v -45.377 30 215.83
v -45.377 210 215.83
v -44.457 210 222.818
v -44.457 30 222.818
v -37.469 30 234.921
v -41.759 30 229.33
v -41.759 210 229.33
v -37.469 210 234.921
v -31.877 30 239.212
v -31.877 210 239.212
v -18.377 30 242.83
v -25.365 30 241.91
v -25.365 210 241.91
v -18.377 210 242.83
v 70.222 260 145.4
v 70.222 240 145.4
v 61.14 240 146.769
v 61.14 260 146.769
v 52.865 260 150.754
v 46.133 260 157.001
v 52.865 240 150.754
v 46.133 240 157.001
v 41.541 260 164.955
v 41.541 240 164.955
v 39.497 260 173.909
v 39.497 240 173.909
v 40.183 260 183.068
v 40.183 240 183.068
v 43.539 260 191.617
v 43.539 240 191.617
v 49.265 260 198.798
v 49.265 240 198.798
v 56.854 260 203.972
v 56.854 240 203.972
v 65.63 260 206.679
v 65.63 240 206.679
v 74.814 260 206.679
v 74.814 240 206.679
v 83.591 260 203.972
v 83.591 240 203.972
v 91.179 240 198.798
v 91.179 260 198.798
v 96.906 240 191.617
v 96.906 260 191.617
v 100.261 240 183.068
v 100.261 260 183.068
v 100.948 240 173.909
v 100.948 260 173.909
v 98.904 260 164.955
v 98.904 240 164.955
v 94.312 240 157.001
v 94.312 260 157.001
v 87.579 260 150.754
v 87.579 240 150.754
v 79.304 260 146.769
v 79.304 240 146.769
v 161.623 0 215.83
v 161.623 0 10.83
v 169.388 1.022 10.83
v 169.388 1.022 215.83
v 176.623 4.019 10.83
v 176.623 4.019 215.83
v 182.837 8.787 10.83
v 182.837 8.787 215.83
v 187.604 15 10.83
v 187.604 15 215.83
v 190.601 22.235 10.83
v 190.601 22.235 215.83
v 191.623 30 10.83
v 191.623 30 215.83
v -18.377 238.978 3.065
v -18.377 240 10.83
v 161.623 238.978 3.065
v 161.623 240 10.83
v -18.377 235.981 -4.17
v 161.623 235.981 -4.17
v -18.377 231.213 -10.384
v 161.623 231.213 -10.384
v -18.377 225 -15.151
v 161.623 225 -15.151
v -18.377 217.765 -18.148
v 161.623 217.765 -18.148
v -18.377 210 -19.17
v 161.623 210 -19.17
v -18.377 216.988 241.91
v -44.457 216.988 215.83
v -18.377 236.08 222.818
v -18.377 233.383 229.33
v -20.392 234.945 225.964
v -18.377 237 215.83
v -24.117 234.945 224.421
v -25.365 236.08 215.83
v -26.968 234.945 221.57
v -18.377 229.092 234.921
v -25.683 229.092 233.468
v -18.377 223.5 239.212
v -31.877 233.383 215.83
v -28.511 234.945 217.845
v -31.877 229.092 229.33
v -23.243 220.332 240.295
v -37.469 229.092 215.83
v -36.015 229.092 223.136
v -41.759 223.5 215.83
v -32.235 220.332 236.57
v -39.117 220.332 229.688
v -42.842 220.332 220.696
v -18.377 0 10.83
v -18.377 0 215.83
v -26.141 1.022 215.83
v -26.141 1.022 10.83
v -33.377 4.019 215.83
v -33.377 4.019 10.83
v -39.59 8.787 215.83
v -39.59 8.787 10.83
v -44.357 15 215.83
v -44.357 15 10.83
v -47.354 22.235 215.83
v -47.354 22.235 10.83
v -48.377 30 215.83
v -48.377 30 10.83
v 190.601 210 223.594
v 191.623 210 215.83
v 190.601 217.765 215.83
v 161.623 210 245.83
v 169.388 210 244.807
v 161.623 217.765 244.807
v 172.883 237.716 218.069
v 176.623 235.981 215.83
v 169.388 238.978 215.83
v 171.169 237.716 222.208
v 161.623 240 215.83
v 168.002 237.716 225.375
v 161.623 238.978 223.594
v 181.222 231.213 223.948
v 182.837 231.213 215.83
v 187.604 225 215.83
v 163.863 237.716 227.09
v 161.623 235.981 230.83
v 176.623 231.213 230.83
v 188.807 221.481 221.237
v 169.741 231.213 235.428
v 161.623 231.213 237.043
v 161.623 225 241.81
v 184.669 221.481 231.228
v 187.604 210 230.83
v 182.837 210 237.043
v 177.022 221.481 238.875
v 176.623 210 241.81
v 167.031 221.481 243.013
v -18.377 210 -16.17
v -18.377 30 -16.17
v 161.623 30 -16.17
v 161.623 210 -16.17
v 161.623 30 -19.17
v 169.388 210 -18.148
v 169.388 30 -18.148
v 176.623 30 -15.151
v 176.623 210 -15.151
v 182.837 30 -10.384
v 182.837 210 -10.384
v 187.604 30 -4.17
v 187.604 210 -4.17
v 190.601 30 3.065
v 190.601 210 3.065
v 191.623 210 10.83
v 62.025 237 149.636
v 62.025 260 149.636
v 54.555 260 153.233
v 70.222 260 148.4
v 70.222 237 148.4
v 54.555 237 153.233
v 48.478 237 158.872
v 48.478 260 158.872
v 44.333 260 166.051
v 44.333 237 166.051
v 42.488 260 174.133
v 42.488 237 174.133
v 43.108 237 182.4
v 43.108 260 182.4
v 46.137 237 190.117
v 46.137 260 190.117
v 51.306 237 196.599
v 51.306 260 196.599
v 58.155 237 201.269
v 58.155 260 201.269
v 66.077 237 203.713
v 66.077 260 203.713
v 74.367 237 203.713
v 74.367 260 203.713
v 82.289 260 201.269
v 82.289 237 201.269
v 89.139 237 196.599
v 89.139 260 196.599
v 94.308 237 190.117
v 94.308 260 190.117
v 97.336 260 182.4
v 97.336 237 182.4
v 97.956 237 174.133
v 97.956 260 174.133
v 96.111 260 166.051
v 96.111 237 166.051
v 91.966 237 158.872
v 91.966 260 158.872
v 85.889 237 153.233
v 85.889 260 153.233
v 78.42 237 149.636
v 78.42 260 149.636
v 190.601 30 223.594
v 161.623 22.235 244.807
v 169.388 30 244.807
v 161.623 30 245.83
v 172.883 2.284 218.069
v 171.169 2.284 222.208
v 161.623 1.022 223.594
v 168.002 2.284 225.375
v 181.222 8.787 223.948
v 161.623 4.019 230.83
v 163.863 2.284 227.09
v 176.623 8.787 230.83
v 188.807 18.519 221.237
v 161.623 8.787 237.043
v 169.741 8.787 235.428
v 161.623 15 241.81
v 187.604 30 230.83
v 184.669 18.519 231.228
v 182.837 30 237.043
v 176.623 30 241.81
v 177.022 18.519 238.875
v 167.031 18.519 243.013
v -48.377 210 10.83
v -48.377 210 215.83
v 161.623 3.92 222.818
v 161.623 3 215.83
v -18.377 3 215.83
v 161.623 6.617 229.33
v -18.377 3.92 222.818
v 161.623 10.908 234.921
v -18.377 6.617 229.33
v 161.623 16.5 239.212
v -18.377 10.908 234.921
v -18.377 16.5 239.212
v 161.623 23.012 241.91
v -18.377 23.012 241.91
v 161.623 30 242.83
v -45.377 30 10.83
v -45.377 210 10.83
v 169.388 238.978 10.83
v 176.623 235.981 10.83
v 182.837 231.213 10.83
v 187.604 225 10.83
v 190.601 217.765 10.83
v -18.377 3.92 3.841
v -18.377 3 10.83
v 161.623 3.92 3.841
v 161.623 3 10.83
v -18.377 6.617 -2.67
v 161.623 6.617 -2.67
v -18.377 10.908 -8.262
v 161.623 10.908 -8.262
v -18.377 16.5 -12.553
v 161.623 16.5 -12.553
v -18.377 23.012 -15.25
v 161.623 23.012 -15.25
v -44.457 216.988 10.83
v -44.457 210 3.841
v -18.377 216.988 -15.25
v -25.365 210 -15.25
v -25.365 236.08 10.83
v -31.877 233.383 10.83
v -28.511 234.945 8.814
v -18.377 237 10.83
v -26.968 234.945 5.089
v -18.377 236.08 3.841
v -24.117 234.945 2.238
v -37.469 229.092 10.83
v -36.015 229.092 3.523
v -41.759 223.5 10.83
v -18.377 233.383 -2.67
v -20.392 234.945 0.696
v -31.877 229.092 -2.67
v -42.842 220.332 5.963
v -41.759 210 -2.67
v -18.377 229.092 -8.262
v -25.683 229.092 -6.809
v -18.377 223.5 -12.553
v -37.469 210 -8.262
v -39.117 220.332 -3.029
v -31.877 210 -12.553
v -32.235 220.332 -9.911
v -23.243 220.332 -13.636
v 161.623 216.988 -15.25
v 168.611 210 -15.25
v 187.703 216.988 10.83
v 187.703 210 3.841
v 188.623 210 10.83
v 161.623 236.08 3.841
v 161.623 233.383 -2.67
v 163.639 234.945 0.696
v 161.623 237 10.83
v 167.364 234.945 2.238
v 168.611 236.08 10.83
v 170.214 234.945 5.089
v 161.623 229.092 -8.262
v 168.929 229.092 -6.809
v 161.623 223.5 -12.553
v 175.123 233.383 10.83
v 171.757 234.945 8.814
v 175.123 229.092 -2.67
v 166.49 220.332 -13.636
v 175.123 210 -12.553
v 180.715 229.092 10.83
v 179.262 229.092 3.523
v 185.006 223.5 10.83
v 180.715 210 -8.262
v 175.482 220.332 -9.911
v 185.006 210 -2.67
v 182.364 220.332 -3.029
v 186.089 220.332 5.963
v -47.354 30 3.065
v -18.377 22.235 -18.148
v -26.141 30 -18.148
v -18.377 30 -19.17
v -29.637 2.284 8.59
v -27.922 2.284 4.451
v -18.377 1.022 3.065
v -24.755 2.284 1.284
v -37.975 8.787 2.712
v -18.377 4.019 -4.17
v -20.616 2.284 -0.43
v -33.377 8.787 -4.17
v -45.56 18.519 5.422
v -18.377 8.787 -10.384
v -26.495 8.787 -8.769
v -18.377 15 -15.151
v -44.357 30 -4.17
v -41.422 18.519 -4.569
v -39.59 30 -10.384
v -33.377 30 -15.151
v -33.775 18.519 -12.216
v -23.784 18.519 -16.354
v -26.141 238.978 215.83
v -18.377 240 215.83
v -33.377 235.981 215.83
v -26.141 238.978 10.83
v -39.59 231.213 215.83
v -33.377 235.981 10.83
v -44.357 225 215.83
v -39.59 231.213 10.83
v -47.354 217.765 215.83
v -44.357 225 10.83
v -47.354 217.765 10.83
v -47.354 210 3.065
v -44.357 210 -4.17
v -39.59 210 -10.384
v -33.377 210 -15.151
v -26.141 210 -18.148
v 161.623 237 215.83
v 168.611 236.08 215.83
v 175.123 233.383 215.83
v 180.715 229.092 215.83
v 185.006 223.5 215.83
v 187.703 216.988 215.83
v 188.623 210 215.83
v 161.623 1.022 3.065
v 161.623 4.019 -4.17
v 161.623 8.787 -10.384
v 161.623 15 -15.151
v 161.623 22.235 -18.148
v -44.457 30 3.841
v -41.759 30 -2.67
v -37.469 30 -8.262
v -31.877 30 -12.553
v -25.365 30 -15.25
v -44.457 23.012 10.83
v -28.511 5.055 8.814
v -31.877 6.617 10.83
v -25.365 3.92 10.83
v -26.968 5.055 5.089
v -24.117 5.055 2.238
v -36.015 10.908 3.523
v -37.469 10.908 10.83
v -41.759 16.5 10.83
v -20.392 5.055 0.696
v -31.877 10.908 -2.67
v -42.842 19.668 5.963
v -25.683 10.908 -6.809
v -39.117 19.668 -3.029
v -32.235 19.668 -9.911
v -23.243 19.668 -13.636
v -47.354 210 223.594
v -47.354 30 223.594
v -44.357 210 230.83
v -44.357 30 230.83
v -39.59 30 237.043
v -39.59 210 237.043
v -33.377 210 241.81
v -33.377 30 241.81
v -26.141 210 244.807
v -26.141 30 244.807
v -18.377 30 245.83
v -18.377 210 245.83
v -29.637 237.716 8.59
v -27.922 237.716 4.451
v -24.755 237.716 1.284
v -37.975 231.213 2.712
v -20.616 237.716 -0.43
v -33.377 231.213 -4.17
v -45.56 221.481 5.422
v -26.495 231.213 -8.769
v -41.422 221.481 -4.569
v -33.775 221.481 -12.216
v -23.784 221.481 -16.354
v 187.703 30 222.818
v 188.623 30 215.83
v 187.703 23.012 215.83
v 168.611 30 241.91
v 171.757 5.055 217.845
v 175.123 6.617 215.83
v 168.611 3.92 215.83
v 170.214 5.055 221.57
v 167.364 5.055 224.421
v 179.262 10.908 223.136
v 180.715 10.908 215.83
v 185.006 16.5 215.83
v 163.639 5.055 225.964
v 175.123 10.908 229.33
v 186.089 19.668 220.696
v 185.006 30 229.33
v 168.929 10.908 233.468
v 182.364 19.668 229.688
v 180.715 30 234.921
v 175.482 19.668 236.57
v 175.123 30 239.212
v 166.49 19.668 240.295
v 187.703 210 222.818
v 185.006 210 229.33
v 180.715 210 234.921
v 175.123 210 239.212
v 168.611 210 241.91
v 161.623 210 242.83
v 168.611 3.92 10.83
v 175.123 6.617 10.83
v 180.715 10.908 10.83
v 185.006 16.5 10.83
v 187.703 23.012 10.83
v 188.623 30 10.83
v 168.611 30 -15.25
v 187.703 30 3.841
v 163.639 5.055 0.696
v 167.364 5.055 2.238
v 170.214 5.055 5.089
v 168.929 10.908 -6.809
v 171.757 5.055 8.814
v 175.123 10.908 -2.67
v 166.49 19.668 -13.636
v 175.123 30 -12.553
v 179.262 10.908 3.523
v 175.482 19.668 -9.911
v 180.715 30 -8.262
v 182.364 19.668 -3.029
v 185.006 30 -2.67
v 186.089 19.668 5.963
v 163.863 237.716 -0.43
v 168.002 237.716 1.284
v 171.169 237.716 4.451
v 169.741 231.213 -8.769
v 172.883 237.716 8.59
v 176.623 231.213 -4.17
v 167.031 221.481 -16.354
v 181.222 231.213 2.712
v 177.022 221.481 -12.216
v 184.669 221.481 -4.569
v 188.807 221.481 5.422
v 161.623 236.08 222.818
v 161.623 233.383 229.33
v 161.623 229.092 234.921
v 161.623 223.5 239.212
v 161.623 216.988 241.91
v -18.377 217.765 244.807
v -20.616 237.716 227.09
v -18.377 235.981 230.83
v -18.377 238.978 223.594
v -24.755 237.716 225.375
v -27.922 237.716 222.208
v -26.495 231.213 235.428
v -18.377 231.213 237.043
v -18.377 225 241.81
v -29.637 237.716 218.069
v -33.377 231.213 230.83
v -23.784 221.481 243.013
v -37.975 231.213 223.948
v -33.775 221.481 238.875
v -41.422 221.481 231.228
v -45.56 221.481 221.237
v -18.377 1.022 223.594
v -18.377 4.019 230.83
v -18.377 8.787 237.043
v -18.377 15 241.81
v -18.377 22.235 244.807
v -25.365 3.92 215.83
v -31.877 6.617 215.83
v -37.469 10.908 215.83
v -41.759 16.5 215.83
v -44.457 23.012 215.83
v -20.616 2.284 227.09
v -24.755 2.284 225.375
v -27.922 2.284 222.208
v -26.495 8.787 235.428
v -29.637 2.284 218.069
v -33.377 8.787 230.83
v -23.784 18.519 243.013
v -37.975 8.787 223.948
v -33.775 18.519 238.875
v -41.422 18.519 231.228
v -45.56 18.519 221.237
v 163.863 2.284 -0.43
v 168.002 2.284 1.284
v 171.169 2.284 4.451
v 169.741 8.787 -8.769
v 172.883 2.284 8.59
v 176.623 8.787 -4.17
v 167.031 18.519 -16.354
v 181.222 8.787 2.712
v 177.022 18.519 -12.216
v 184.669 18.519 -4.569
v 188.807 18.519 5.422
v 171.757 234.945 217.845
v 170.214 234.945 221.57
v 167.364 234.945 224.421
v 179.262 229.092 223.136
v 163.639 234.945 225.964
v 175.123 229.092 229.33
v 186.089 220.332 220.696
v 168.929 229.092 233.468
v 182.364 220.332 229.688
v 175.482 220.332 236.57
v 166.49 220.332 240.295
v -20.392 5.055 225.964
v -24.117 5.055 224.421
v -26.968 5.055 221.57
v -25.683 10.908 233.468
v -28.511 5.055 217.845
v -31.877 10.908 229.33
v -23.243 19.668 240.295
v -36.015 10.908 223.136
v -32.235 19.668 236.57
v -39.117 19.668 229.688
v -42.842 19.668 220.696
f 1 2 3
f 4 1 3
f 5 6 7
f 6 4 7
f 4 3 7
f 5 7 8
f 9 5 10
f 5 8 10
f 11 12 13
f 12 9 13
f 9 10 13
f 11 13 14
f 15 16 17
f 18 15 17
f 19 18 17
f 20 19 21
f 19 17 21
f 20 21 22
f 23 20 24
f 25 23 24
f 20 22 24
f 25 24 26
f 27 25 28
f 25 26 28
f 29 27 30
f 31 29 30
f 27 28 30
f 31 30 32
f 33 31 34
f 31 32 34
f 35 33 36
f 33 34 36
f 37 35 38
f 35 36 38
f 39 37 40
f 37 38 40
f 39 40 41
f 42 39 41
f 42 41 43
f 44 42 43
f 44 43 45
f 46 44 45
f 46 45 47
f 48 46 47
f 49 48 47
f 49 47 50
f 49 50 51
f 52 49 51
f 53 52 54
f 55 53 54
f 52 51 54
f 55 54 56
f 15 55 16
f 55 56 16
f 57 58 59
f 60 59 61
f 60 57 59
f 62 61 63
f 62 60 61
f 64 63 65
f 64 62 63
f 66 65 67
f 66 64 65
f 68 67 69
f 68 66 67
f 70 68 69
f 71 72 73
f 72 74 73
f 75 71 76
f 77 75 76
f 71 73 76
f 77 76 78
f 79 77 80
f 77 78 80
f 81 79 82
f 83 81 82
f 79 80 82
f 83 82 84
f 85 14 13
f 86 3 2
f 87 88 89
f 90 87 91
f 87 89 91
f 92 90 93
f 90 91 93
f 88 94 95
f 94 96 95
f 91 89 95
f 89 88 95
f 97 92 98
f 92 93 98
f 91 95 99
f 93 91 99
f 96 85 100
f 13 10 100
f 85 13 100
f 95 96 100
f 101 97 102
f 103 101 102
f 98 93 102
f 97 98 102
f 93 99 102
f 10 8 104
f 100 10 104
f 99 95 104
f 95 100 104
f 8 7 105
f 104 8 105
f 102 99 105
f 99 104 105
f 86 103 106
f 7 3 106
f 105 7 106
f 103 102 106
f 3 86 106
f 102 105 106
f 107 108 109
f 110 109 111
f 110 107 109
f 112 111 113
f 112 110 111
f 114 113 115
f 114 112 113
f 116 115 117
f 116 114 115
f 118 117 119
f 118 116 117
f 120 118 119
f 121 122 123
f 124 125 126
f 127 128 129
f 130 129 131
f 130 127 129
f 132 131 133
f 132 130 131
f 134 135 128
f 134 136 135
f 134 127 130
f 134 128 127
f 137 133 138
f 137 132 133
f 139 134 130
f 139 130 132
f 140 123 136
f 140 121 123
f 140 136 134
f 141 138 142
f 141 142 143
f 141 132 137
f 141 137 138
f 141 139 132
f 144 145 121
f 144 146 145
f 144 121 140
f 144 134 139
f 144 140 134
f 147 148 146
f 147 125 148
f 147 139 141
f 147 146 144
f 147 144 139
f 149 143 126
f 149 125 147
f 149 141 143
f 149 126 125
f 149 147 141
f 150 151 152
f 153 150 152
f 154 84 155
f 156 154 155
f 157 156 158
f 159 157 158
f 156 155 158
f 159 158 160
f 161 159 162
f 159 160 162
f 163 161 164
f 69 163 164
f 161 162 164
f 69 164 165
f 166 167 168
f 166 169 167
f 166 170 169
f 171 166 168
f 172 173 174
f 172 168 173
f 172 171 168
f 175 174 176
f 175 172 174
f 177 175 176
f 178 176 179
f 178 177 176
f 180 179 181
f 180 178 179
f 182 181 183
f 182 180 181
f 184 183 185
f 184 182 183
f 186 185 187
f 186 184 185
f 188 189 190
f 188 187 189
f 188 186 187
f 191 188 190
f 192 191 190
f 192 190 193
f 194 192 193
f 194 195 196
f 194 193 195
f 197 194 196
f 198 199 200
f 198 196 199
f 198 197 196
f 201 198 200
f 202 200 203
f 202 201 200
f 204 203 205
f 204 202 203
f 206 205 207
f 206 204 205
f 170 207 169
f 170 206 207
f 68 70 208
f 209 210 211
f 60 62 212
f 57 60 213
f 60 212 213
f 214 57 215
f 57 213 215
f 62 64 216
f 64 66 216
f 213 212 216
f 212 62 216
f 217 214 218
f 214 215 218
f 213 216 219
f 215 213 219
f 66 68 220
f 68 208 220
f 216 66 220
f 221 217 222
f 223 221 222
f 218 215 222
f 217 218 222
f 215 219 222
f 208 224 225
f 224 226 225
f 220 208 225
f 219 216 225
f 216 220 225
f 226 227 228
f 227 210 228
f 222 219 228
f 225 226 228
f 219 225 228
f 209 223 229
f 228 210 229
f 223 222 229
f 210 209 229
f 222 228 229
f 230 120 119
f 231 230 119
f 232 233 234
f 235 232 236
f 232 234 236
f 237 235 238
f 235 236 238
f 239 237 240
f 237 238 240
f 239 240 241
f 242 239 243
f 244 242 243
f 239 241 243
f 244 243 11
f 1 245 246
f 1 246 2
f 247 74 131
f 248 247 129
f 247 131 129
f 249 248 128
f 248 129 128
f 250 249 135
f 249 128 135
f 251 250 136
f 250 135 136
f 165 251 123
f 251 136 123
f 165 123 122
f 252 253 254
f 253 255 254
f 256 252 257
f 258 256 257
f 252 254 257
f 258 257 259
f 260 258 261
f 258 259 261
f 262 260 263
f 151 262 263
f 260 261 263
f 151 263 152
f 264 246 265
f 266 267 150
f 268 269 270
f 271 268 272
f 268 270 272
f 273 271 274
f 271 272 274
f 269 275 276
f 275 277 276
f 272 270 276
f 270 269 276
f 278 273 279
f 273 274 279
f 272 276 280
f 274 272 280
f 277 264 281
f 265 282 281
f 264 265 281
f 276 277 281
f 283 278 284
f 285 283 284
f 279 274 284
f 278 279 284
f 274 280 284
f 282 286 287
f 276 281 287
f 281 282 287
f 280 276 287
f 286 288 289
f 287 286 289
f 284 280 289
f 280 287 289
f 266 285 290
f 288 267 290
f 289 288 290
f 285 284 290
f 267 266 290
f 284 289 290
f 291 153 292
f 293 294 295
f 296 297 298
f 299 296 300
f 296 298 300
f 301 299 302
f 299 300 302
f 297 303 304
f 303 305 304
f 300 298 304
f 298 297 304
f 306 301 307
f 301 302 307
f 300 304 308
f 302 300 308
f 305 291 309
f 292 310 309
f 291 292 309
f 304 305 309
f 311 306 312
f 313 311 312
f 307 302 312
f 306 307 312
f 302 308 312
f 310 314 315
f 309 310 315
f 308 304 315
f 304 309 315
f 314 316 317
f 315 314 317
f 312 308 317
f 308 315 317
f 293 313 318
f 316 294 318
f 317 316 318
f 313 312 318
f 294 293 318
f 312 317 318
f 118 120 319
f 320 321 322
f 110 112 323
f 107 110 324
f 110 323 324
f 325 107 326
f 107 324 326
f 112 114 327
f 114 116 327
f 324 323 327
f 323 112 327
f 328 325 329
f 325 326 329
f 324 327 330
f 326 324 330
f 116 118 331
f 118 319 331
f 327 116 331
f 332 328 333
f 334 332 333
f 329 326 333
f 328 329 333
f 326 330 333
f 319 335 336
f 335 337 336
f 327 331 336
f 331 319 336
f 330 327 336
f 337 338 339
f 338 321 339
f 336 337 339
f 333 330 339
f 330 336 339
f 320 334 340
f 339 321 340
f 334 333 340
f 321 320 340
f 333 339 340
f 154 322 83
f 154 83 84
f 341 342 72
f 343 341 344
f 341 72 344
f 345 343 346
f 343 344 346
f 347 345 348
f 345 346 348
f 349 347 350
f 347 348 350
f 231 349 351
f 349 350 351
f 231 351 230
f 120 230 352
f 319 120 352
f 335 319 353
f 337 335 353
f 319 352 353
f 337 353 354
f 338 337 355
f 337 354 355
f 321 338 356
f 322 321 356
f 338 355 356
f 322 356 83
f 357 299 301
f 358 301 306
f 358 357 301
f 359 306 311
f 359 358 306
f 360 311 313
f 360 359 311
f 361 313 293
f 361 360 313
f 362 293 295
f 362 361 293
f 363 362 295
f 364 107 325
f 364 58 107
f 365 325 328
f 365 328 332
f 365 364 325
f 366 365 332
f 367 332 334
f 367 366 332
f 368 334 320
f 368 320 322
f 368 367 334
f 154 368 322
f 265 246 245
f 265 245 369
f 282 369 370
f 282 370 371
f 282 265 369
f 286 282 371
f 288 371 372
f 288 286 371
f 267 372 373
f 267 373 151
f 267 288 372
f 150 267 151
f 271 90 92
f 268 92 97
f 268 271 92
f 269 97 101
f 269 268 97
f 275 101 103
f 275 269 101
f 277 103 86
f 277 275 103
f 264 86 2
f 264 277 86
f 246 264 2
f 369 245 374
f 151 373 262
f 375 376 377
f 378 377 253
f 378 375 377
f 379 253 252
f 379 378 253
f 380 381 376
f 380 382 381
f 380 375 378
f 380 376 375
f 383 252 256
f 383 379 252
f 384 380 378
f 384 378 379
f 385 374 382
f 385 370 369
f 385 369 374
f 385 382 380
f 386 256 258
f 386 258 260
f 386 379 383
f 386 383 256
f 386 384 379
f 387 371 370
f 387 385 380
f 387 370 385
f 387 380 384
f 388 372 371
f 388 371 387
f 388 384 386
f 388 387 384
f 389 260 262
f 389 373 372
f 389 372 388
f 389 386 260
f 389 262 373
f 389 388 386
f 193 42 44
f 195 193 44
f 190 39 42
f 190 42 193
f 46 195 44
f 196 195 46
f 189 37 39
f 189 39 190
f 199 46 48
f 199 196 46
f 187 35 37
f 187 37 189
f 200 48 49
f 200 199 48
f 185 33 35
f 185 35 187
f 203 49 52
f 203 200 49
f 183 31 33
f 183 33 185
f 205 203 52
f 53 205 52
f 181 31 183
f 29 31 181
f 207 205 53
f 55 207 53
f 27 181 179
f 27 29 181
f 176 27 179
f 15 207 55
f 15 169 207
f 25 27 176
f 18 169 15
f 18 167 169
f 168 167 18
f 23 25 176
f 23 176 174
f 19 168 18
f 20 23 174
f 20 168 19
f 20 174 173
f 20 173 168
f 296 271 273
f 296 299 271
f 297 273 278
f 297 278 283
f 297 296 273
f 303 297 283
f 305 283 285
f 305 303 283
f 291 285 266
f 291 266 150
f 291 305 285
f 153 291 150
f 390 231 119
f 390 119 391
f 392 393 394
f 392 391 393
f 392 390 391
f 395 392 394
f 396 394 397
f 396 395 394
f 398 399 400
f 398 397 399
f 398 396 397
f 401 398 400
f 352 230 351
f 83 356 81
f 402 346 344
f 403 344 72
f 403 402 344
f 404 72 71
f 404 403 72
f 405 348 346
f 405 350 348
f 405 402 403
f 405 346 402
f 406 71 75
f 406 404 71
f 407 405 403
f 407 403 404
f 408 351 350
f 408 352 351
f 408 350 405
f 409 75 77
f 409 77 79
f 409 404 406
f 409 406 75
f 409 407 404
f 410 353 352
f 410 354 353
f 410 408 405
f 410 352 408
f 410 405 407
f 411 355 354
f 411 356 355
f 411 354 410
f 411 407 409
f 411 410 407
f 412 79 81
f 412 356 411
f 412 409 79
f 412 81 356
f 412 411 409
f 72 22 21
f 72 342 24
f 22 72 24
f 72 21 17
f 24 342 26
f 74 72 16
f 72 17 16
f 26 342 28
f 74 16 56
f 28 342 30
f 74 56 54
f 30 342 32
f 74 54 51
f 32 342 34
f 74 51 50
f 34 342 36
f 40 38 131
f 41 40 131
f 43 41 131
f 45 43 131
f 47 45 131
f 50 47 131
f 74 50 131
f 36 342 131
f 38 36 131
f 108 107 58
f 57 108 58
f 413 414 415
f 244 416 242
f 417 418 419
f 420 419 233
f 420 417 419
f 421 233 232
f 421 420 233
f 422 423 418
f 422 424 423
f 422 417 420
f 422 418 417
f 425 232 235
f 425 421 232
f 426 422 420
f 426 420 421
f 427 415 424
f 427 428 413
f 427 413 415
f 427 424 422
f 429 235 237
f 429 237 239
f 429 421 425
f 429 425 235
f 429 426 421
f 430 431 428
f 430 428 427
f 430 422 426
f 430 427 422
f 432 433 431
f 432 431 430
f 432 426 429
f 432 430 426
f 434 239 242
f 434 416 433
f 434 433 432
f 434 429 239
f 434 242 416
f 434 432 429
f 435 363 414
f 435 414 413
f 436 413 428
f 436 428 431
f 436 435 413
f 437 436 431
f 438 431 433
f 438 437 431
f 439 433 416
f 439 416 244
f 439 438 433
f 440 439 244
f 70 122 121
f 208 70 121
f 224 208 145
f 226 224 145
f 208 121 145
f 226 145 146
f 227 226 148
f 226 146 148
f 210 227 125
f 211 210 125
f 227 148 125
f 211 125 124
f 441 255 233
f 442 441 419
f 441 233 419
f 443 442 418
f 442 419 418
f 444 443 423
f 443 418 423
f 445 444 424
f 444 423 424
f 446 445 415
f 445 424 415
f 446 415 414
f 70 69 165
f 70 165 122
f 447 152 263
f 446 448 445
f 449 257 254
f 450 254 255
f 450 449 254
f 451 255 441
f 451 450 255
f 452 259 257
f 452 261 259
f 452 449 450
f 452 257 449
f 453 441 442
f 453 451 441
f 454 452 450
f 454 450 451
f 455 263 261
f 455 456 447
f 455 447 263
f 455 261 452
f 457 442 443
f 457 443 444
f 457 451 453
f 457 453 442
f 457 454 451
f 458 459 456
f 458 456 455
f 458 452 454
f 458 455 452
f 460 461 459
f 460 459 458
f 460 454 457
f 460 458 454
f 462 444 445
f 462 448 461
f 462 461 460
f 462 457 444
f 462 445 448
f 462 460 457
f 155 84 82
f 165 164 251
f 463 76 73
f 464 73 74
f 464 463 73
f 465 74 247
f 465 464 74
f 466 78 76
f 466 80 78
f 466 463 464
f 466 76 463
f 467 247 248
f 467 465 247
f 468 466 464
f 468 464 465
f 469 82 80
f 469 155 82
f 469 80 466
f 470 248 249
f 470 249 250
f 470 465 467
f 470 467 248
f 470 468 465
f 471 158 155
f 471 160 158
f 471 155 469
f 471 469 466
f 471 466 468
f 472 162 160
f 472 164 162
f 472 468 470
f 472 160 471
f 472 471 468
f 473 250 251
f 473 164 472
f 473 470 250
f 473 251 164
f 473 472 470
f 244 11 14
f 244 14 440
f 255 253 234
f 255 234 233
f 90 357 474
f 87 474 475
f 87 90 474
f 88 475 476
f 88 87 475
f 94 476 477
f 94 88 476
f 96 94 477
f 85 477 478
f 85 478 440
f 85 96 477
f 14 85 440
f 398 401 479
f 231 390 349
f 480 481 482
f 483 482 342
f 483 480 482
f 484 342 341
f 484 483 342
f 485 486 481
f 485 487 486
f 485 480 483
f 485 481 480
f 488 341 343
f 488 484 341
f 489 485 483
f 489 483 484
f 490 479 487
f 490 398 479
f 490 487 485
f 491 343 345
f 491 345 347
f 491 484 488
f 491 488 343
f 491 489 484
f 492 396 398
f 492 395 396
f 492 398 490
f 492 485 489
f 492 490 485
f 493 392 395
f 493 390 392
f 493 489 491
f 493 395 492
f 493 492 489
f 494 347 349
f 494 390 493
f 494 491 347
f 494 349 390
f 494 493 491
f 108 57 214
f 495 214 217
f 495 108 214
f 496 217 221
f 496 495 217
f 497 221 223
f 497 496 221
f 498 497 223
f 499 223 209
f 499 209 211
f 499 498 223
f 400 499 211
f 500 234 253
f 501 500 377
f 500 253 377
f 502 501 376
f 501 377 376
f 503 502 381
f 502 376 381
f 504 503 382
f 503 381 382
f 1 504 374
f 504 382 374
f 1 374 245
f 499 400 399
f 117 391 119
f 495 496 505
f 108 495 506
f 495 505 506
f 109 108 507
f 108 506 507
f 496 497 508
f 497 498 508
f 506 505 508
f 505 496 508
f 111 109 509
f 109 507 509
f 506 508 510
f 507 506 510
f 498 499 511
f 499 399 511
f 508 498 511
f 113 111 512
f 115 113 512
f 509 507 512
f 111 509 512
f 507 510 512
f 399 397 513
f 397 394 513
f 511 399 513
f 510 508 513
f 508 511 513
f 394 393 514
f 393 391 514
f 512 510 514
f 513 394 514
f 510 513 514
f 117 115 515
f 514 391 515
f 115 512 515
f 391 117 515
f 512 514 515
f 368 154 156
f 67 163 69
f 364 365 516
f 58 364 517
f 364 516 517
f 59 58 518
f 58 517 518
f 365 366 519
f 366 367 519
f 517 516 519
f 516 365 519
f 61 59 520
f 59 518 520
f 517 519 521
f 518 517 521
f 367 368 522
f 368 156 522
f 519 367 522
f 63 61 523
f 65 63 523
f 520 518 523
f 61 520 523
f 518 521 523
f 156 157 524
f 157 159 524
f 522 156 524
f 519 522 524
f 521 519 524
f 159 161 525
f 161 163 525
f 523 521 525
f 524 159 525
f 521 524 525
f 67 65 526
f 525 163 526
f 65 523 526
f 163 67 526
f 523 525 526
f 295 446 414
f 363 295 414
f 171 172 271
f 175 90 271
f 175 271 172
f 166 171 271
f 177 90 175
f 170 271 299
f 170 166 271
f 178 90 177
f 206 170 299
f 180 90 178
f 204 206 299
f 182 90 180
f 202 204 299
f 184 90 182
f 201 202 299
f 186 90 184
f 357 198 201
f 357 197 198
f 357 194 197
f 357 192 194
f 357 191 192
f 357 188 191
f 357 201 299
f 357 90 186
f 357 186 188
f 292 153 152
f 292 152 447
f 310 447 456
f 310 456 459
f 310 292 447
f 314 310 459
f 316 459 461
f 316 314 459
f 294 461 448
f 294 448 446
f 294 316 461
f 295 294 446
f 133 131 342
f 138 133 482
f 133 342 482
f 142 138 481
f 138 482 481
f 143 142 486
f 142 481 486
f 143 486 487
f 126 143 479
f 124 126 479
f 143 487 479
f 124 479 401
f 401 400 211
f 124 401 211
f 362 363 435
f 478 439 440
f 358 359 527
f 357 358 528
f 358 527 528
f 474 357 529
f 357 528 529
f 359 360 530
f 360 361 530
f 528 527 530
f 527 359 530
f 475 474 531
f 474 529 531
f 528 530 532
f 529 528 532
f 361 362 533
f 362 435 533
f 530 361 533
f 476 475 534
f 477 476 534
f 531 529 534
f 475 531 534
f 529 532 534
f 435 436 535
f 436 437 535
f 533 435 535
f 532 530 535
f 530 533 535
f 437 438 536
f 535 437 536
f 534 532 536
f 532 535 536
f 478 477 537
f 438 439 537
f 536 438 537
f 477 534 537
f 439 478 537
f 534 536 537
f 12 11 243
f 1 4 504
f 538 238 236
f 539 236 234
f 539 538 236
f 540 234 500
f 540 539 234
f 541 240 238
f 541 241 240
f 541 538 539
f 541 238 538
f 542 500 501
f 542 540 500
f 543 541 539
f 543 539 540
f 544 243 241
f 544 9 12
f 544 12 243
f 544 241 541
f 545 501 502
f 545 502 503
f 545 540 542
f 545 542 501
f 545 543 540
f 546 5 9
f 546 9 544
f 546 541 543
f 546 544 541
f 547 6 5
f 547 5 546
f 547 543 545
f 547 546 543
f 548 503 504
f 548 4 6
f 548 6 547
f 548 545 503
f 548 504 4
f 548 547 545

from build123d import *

# Parameters (mm, degrees)
CROQUIS1_W              = 240
CROQUIS1_H              = 265
SALIENTE_EXTRUIR1_DEPTH = 240
REDONDEO1_R             = 30
REDONDEO2_R             = 30
CROQUIS2_R              = 30.811504022
SALIENTE_EXTRUIR2_DEPTH = 20
VACIADO1_T              = -3


with BuildPart() as part:
    # Croquis1 → Saliente-Extruir1 (new body)
    with BuildSketch(Plane.XZ):
        with Locations((71.623347888, 113.329596413)):
            Rectangle(CROQUIS1_W, CROQUIS1_H)
    extrude(amount=-SALIENTE_EXTRUIR1_DEPTH)

    # Redondeo1
    redondeo1_edges = [part.edges().sort_by_distance(p)[0] for p in [
        (-48.376652112, 120, 245.829596413),
        (191.623347888, 120, 245.829596413),
        (191.623347888, 120, -19.170403587),
        (-48.376652112, 120, -19.170403587),
    ]]
    fillet(redondeo1_edges, radius=REDONDEO1_R)

    # Redondeo2
    redondeo2_edges = [part.edges().sort_by_distance(p)[0] for p in [
        (71.623347888, 0, -19.170403587),
        (71.623347888, 240, -19.170403587),
        (-48.376652112, 0, 113.329596413),
        (191.623347888, 0, 113.329596413),
        (71.623347888, 0, 245.829596413),
        (-39.589855548, 0, 237.042799848),
        (-39.589855548, 0, -10.383607023),
        (182.836551323, 0, 237.042799848),
        (182.836551323, 0, -10.383607023),
        (191.623347888, 240, 113.329596413),
        (-48.376652112, 240, 113.329596413),
        (71.623347888, 240, 245.829596413),
        (-39.589855548, 240, 237.042799848),
        (-39.589855548, 240, -10.383607023),
        (182.836551323, 240, 237.042799848),
        (182.836551323, 240, -10.383607023),
    ]]
    fillet(redondeo2_edges, radius=REDONDEO2_R)

    # Croquis2 → Saliente-Extruir2 (add)
    with BuildSketch(Plane(origin=(0, 240, 0), x_dir=(1, 0, 0), z_dir=(0, 1, 0))):
        with Locations(Location((70.222158981, -176.211697137, 0), (0, 0, 90))):
            Circle(CROQUIS2_R)
    extrude(amount=SALIENTE_EXTRUIR2_DEPTH)

    # Vaciado1
    vaciado1_openings = [part.faces().sort_by_distance(p)[0] for p in [
        (70.222158981, 260, 176.211697137),
    ]]
    offset(amount=VACIADO1_T, openings=vaciado1_openings, kind=Kind.INTERSECTION)


solid = part.part
